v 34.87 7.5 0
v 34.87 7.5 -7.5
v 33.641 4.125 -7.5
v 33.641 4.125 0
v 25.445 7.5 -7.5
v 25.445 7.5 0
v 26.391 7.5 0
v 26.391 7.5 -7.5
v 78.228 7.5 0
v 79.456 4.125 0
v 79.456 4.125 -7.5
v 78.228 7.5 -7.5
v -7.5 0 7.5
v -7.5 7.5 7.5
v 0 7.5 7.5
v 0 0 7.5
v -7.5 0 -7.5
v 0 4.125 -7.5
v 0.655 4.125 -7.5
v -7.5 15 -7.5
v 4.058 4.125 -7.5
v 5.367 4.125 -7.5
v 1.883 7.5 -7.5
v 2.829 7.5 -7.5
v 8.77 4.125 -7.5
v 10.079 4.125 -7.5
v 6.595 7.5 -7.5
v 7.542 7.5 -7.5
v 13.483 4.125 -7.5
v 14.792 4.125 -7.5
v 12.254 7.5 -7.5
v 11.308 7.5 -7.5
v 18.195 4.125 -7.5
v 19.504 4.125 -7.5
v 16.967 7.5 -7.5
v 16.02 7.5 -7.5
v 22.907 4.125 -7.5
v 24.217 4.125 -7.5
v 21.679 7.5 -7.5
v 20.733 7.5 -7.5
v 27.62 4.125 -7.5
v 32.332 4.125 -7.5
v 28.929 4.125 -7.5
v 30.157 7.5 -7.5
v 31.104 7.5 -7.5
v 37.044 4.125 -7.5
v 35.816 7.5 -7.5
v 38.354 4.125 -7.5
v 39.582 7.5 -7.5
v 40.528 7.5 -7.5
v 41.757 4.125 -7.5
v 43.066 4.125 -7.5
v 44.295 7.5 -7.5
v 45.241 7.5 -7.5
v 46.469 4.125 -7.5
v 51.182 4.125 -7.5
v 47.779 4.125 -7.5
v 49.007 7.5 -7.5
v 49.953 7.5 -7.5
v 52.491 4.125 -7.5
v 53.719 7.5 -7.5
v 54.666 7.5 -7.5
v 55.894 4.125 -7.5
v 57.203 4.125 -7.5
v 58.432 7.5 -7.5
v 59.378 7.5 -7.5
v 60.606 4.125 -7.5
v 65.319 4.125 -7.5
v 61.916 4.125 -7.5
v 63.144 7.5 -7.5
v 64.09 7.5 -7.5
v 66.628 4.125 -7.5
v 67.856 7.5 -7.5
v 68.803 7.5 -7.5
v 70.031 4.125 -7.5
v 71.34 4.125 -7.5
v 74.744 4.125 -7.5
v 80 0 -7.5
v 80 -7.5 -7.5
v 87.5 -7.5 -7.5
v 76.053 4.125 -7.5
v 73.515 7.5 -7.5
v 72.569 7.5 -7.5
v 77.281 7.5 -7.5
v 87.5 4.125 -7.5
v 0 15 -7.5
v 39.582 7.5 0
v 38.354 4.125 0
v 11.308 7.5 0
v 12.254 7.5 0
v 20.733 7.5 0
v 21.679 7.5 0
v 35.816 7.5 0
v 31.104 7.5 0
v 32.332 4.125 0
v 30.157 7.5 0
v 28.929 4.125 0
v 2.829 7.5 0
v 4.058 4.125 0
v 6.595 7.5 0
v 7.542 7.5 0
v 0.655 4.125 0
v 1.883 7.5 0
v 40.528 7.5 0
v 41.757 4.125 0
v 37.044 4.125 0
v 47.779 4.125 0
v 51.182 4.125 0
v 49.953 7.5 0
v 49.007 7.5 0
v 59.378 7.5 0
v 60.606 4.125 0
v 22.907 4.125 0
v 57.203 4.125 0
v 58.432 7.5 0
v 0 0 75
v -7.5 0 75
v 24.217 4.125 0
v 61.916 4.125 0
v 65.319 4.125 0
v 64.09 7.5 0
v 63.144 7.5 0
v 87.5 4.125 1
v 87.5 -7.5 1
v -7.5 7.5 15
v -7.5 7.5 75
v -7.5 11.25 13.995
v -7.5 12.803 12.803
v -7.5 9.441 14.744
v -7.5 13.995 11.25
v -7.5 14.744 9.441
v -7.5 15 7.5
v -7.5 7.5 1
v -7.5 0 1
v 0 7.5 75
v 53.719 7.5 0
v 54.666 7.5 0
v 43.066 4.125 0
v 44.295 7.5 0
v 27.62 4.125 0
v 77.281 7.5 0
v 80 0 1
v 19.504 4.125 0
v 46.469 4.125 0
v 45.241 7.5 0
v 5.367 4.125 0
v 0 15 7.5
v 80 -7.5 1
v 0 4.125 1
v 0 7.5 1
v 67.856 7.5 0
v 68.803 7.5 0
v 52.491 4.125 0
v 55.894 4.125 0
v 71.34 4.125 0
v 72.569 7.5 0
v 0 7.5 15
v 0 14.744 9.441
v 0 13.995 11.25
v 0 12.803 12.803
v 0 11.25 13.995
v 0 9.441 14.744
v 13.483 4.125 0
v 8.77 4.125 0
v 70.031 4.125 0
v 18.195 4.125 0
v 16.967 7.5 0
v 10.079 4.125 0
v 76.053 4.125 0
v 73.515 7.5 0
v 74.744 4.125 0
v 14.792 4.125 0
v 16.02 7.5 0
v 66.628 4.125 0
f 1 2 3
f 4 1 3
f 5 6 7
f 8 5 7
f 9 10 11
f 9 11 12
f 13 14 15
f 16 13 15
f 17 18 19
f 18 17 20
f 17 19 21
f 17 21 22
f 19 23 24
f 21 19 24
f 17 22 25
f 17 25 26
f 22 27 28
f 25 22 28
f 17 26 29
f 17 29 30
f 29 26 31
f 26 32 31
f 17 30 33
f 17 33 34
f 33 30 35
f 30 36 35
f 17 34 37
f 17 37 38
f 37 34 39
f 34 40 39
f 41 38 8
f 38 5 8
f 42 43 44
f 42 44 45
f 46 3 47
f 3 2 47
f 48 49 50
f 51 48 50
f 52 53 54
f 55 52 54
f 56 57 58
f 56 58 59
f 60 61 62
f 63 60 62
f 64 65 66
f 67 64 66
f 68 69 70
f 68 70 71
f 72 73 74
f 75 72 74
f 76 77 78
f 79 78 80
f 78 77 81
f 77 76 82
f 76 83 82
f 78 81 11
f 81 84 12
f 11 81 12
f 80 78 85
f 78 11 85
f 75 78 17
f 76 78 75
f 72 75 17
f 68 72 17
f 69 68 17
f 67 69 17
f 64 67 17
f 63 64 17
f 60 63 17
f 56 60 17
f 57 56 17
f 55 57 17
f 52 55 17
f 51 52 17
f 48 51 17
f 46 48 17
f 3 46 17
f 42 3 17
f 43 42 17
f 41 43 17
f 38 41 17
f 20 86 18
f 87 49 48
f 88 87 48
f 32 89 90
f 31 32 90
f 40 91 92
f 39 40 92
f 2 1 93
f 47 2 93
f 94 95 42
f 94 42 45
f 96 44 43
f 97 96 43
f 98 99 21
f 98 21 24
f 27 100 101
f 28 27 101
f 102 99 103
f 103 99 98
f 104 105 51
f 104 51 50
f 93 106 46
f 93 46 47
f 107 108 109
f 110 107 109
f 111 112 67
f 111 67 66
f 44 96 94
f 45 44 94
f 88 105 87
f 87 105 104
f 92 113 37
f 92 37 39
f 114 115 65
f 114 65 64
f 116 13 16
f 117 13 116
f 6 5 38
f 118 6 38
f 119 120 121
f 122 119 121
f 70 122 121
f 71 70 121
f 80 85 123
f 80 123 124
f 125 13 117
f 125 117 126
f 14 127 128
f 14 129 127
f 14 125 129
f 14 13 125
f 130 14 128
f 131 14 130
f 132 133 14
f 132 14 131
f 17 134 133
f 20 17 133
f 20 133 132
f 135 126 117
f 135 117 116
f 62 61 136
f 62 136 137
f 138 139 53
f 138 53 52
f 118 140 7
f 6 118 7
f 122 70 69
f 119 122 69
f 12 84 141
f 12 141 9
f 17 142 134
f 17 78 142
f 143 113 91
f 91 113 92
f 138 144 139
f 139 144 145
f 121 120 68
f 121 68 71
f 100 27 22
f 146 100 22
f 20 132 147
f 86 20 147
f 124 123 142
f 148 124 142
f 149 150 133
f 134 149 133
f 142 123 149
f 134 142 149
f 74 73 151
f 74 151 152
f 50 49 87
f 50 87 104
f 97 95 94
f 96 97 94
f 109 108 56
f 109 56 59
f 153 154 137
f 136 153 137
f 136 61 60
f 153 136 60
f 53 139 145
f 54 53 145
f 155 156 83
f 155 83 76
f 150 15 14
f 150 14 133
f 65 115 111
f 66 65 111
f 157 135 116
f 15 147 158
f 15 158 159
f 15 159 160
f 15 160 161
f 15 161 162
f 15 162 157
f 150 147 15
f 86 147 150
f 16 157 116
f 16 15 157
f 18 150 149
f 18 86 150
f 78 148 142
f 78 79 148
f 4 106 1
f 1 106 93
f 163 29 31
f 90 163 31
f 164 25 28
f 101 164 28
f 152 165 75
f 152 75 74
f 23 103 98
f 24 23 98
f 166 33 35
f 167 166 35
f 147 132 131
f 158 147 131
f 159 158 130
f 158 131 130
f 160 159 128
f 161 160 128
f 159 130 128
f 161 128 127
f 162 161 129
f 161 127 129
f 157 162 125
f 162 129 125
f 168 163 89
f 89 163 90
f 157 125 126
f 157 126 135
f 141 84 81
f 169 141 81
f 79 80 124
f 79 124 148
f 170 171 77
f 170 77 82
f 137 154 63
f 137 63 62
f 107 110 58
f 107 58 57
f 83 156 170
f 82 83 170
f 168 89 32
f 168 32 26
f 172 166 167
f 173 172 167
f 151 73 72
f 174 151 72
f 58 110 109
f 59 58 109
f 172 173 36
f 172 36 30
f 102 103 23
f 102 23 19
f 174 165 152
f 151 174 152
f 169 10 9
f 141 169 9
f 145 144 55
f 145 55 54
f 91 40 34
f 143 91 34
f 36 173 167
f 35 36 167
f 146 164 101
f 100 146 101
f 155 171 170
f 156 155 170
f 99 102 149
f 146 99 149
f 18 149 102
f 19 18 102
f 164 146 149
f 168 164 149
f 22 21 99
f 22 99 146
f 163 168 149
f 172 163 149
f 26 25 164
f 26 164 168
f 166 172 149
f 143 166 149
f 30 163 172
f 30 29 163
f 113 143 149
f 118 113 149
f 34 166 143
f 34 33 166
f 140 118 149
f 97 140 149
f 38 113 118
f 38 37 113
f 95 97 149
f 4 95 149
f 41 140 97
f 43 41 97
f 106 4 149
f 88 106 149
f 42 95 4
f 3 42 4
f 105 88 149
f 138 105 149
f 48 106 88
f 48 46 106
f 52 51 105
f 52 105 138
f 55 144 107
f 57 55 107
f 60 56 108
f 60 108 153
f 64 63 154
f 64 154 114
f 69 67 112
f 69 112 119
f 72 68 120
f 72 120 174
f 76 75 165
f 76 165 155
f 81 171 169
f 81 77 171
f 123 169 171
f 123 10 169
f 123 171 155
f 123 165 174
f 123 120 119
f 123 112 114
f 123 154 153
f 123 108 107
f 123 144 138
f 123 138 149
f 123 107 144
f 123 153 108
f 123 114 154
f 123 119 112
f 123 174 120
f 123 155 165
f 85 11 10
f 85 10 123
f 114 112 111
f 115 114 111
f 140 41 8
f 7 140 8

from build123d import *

# Parameters (mm, degrees)
BLANKSKE_W              = 80
BLANKSKE_H              = 7.5
BLANK_DEPTH             = 20
TOOTHCUTSIM_DEPTH       = 83.802475808
TEETHCUTS_COUNT         = 18
TEETHCUTS_PITCH         = 4.712388975
SKETCH1_W               = 20
SKETCH1_H               = 11.625
BOSS_EXTRUDE2_DEPTH     = 7.5
SKETCH3_W               = 20
SKETCH3_H               = 15
BOSS_EXTRUDE3_DEPTH     = 7.5
SKETCH4_W               = 7.5
SKETCH4_H               = 15
BOSS_EXTRUDE4_DEPTH     = 15
SKETCH8_W               = 7.5
SKETCH8_H               = 7.5
CUT_EXTRUDE1_DEPTH      = 15
CUT_EXTRUDE2_DEPTH      = 15
SKETCH10_W              = 7.5
SKETCH10_H              = 7.5
BOSS_EXTRUDE5_DEPTH     = 7.5
SKETCH11_W              = 7.5
SKETCH11_H              = 15
BOSS_EXTRUDE7_DEPTH     = 60
CUT_EXTRUDE4_DEPTH      = 116.829144109
CUT_EXTRUDE4_DEPTH_BACK = 116.829144109
SKETCH12_W              = 95
SKETCH12_H              = 10
SKETCH14_W              = 95
SKETCH14_H              = 2.5
CUT_EXTRUDE5_DEPTH      = 100
SKETCH15_W              = 67.5
SKETCH15_H              = 7.5
CUT_EXTRUDE6_DEPTH      = 122.963109177
BOSS_EXTRUDE8_DEPTH     = 7.5
BOSS_EXTRUDE9_DEPTH     = 1


with BuildPart() as part:
    # BlankSke → Blank (new body)
    with BuildSketch(Plane.XY):
        with Locations((40, 3.75)):
            Rectangle(BLANKSKE_W, BLANKSKE_H)
    extrude(amount=-BLANK_DEPTH)

    # TooCutSkeSim → ToothCutSim (cut, through all)
    with BuildSketch(Plane.XY):
        Polygon((0.654653055, 4.125), (-0.654653055, 4.125), (-1.892297439, 7.5254), (1.892297439, 7.5254), align=None)
    toothcutsim = extrude(amount=-TOOTHCUTSIM_DEPTH, mode=Mode.SUBTRACT)

    # TeethCuts: ToothCutSim ×18
    with Locations(*[(i * TEETHCUTS_PITCH, 0, 0) for i in range(1, TEETHCUTS_COUNT)]):
        add(toothcutsim, mode=Mode.SUBTRACT)

    # Sketch1 → Boss-Extrude2 (add)
    with BuildSketch(Plane(origin=(80, 0, 0), x_dir=(0, 0, -1), z_dir=(1, 0, 0))):
        with Locations((10, -1.6875)):
            Rectangle(SKETCH1_W, SKETCH1_H)
    extrude(amount=BOSS_EXTRUDE2_DEPTH)

    # Sketch3 → Boss-Extrude3 (add)
    with BuildSketch(Plane.ZY):
        with Locations((-10, 7.5)):
            Rectangle(SKETCH3_W, SKETCH3_H)
    extrude(amount=BOSS_EXTRUDE3_DEPTH)

    # Sketch4 → Boss-Extrude4 (add)
    with BuildSketch(Plane.XY):
        with Locations((-3.75, 7.5)):
            Rectangle(SKETCH4_W, SKETCH4_H)
    extrude(amount=BOSS_EXTRUDE4_DEPTH)

    # Sketch8 → Cut-Extrude1 (cut)
    with BuildSketch(Plane(origin=(0, 0, 0), x_dir=(0, 0, -1), z_dir=(1, 0, 0))):
        with Locations((-3.75, 3.75)):
            Rectangle(SKETCH8_W, SKETCH8_H)
    extrude(amount=-CUT_EXTRUDE1_DEPTH, mode=Mode.SUBTRACT)

    # Sketch9 → Cut-Extrude2 (cut)
    with BuildSketch(Plane.ZY.offset(7.5)):
        Polygon((7.5, 15), (15, 7.5), (15, 15), align=None)
    extrude(amount=-CUT_EXTRUDE2_DEPTH, mode=Mode.SUBTRACT)

    # Sketch10 → Boss-Extrude5 (add)
    with BuildSketch(Plane.XZ):
        with Locations((-3.75, 11.25)):
            Rectangle(SKETCH10_W, SKETCH10_H)
    extrude(amount=BOSS_EXTRUDE5_DEPTH)

    # Sketch11 → Boss-Extrude7 (add)
    with BuildSketch(Plane.XY.offset(15)):
        with Locations((-3.75, 0)):
            Rectangle(SKETCH11_W, SKETCH11_H)
    extrude(amount=BOSS_EXTRUDE7_DEPTH)

    # Sketch12 → Cut-Extrude4 (cut, two sides: drawn at the far end of the back side and taken through both)
    with BuildSketch(Plane(origin=(0, 4.125, 0), x_dir=(1, 0, 0), z_dir=(0, 1, 0)).offset(-CUT_EXTRUDE4_DEPTH_BACK)):
        with Locations((40, 15)):
            Rectangle(SKETCH12_W, SKETCH12_H)
    extrude(amount=CUT_EXTRUDE4_DEPTH + CUT_EXTRUDE4_DEPTH_BACK, mode=Mode.SUBTRACT)

    # Sketch14 → Cut-Extrude5 (cut)
    with BuildSketch(Plane(origin=(0, 15, 0), x_dir=(1, 0, 0), z_dir=(0, 1, 0))):
        with Locations((40, 8.75)):
            Rectangle(SKETCH14_W, SKETCH14_H)
    extrude(amount=-CUT_EXTRUDE5_DEPTH, mode=Mode.SUBTRACT)

    # Sketch15 → Cut-Extrude6 (cut, through all)
    with BuildSketch(Plane.ZY.offset(7.5)):
        with Locations((41.25, -3.75)):
            Rectangle(SKETCH15_W, SKETCH15_H)
    extrude(amount=-CUT_EXTRUDE6_DEPTH, mode=Mode.SUBTRACT)

    # Sketch16 → Boss-Extrude8 (add)
    with BuildSketch(Plane.ZY.offset(7.5)):
        with BuildLine():
            Line((7.5, 7.5), (7.5, 15))
            ThreePointArc((7.5, 15), (12.803300859, 12.803300859), (15, 7.5))
            Line((15, 7.5), (7.5, 7.5))
        make_face()
    extrude(amount=-BOSS_EXTRUDE8_DEPTH)

    # Sketch19 → Boss-Extrude9 (add)
    with BuildSketch(Plane.XY):
        Polygon((-7.5, 0), (-7.5, 7.5), (0, 7.5), (0, 4.125), (87.5, 4.125), (87.5, -7.5), (80, -7.5), (80, 0), align=None)
    extrude(amount=BOSS_EXTRUDE9_DEPTH)


solid = part.part
